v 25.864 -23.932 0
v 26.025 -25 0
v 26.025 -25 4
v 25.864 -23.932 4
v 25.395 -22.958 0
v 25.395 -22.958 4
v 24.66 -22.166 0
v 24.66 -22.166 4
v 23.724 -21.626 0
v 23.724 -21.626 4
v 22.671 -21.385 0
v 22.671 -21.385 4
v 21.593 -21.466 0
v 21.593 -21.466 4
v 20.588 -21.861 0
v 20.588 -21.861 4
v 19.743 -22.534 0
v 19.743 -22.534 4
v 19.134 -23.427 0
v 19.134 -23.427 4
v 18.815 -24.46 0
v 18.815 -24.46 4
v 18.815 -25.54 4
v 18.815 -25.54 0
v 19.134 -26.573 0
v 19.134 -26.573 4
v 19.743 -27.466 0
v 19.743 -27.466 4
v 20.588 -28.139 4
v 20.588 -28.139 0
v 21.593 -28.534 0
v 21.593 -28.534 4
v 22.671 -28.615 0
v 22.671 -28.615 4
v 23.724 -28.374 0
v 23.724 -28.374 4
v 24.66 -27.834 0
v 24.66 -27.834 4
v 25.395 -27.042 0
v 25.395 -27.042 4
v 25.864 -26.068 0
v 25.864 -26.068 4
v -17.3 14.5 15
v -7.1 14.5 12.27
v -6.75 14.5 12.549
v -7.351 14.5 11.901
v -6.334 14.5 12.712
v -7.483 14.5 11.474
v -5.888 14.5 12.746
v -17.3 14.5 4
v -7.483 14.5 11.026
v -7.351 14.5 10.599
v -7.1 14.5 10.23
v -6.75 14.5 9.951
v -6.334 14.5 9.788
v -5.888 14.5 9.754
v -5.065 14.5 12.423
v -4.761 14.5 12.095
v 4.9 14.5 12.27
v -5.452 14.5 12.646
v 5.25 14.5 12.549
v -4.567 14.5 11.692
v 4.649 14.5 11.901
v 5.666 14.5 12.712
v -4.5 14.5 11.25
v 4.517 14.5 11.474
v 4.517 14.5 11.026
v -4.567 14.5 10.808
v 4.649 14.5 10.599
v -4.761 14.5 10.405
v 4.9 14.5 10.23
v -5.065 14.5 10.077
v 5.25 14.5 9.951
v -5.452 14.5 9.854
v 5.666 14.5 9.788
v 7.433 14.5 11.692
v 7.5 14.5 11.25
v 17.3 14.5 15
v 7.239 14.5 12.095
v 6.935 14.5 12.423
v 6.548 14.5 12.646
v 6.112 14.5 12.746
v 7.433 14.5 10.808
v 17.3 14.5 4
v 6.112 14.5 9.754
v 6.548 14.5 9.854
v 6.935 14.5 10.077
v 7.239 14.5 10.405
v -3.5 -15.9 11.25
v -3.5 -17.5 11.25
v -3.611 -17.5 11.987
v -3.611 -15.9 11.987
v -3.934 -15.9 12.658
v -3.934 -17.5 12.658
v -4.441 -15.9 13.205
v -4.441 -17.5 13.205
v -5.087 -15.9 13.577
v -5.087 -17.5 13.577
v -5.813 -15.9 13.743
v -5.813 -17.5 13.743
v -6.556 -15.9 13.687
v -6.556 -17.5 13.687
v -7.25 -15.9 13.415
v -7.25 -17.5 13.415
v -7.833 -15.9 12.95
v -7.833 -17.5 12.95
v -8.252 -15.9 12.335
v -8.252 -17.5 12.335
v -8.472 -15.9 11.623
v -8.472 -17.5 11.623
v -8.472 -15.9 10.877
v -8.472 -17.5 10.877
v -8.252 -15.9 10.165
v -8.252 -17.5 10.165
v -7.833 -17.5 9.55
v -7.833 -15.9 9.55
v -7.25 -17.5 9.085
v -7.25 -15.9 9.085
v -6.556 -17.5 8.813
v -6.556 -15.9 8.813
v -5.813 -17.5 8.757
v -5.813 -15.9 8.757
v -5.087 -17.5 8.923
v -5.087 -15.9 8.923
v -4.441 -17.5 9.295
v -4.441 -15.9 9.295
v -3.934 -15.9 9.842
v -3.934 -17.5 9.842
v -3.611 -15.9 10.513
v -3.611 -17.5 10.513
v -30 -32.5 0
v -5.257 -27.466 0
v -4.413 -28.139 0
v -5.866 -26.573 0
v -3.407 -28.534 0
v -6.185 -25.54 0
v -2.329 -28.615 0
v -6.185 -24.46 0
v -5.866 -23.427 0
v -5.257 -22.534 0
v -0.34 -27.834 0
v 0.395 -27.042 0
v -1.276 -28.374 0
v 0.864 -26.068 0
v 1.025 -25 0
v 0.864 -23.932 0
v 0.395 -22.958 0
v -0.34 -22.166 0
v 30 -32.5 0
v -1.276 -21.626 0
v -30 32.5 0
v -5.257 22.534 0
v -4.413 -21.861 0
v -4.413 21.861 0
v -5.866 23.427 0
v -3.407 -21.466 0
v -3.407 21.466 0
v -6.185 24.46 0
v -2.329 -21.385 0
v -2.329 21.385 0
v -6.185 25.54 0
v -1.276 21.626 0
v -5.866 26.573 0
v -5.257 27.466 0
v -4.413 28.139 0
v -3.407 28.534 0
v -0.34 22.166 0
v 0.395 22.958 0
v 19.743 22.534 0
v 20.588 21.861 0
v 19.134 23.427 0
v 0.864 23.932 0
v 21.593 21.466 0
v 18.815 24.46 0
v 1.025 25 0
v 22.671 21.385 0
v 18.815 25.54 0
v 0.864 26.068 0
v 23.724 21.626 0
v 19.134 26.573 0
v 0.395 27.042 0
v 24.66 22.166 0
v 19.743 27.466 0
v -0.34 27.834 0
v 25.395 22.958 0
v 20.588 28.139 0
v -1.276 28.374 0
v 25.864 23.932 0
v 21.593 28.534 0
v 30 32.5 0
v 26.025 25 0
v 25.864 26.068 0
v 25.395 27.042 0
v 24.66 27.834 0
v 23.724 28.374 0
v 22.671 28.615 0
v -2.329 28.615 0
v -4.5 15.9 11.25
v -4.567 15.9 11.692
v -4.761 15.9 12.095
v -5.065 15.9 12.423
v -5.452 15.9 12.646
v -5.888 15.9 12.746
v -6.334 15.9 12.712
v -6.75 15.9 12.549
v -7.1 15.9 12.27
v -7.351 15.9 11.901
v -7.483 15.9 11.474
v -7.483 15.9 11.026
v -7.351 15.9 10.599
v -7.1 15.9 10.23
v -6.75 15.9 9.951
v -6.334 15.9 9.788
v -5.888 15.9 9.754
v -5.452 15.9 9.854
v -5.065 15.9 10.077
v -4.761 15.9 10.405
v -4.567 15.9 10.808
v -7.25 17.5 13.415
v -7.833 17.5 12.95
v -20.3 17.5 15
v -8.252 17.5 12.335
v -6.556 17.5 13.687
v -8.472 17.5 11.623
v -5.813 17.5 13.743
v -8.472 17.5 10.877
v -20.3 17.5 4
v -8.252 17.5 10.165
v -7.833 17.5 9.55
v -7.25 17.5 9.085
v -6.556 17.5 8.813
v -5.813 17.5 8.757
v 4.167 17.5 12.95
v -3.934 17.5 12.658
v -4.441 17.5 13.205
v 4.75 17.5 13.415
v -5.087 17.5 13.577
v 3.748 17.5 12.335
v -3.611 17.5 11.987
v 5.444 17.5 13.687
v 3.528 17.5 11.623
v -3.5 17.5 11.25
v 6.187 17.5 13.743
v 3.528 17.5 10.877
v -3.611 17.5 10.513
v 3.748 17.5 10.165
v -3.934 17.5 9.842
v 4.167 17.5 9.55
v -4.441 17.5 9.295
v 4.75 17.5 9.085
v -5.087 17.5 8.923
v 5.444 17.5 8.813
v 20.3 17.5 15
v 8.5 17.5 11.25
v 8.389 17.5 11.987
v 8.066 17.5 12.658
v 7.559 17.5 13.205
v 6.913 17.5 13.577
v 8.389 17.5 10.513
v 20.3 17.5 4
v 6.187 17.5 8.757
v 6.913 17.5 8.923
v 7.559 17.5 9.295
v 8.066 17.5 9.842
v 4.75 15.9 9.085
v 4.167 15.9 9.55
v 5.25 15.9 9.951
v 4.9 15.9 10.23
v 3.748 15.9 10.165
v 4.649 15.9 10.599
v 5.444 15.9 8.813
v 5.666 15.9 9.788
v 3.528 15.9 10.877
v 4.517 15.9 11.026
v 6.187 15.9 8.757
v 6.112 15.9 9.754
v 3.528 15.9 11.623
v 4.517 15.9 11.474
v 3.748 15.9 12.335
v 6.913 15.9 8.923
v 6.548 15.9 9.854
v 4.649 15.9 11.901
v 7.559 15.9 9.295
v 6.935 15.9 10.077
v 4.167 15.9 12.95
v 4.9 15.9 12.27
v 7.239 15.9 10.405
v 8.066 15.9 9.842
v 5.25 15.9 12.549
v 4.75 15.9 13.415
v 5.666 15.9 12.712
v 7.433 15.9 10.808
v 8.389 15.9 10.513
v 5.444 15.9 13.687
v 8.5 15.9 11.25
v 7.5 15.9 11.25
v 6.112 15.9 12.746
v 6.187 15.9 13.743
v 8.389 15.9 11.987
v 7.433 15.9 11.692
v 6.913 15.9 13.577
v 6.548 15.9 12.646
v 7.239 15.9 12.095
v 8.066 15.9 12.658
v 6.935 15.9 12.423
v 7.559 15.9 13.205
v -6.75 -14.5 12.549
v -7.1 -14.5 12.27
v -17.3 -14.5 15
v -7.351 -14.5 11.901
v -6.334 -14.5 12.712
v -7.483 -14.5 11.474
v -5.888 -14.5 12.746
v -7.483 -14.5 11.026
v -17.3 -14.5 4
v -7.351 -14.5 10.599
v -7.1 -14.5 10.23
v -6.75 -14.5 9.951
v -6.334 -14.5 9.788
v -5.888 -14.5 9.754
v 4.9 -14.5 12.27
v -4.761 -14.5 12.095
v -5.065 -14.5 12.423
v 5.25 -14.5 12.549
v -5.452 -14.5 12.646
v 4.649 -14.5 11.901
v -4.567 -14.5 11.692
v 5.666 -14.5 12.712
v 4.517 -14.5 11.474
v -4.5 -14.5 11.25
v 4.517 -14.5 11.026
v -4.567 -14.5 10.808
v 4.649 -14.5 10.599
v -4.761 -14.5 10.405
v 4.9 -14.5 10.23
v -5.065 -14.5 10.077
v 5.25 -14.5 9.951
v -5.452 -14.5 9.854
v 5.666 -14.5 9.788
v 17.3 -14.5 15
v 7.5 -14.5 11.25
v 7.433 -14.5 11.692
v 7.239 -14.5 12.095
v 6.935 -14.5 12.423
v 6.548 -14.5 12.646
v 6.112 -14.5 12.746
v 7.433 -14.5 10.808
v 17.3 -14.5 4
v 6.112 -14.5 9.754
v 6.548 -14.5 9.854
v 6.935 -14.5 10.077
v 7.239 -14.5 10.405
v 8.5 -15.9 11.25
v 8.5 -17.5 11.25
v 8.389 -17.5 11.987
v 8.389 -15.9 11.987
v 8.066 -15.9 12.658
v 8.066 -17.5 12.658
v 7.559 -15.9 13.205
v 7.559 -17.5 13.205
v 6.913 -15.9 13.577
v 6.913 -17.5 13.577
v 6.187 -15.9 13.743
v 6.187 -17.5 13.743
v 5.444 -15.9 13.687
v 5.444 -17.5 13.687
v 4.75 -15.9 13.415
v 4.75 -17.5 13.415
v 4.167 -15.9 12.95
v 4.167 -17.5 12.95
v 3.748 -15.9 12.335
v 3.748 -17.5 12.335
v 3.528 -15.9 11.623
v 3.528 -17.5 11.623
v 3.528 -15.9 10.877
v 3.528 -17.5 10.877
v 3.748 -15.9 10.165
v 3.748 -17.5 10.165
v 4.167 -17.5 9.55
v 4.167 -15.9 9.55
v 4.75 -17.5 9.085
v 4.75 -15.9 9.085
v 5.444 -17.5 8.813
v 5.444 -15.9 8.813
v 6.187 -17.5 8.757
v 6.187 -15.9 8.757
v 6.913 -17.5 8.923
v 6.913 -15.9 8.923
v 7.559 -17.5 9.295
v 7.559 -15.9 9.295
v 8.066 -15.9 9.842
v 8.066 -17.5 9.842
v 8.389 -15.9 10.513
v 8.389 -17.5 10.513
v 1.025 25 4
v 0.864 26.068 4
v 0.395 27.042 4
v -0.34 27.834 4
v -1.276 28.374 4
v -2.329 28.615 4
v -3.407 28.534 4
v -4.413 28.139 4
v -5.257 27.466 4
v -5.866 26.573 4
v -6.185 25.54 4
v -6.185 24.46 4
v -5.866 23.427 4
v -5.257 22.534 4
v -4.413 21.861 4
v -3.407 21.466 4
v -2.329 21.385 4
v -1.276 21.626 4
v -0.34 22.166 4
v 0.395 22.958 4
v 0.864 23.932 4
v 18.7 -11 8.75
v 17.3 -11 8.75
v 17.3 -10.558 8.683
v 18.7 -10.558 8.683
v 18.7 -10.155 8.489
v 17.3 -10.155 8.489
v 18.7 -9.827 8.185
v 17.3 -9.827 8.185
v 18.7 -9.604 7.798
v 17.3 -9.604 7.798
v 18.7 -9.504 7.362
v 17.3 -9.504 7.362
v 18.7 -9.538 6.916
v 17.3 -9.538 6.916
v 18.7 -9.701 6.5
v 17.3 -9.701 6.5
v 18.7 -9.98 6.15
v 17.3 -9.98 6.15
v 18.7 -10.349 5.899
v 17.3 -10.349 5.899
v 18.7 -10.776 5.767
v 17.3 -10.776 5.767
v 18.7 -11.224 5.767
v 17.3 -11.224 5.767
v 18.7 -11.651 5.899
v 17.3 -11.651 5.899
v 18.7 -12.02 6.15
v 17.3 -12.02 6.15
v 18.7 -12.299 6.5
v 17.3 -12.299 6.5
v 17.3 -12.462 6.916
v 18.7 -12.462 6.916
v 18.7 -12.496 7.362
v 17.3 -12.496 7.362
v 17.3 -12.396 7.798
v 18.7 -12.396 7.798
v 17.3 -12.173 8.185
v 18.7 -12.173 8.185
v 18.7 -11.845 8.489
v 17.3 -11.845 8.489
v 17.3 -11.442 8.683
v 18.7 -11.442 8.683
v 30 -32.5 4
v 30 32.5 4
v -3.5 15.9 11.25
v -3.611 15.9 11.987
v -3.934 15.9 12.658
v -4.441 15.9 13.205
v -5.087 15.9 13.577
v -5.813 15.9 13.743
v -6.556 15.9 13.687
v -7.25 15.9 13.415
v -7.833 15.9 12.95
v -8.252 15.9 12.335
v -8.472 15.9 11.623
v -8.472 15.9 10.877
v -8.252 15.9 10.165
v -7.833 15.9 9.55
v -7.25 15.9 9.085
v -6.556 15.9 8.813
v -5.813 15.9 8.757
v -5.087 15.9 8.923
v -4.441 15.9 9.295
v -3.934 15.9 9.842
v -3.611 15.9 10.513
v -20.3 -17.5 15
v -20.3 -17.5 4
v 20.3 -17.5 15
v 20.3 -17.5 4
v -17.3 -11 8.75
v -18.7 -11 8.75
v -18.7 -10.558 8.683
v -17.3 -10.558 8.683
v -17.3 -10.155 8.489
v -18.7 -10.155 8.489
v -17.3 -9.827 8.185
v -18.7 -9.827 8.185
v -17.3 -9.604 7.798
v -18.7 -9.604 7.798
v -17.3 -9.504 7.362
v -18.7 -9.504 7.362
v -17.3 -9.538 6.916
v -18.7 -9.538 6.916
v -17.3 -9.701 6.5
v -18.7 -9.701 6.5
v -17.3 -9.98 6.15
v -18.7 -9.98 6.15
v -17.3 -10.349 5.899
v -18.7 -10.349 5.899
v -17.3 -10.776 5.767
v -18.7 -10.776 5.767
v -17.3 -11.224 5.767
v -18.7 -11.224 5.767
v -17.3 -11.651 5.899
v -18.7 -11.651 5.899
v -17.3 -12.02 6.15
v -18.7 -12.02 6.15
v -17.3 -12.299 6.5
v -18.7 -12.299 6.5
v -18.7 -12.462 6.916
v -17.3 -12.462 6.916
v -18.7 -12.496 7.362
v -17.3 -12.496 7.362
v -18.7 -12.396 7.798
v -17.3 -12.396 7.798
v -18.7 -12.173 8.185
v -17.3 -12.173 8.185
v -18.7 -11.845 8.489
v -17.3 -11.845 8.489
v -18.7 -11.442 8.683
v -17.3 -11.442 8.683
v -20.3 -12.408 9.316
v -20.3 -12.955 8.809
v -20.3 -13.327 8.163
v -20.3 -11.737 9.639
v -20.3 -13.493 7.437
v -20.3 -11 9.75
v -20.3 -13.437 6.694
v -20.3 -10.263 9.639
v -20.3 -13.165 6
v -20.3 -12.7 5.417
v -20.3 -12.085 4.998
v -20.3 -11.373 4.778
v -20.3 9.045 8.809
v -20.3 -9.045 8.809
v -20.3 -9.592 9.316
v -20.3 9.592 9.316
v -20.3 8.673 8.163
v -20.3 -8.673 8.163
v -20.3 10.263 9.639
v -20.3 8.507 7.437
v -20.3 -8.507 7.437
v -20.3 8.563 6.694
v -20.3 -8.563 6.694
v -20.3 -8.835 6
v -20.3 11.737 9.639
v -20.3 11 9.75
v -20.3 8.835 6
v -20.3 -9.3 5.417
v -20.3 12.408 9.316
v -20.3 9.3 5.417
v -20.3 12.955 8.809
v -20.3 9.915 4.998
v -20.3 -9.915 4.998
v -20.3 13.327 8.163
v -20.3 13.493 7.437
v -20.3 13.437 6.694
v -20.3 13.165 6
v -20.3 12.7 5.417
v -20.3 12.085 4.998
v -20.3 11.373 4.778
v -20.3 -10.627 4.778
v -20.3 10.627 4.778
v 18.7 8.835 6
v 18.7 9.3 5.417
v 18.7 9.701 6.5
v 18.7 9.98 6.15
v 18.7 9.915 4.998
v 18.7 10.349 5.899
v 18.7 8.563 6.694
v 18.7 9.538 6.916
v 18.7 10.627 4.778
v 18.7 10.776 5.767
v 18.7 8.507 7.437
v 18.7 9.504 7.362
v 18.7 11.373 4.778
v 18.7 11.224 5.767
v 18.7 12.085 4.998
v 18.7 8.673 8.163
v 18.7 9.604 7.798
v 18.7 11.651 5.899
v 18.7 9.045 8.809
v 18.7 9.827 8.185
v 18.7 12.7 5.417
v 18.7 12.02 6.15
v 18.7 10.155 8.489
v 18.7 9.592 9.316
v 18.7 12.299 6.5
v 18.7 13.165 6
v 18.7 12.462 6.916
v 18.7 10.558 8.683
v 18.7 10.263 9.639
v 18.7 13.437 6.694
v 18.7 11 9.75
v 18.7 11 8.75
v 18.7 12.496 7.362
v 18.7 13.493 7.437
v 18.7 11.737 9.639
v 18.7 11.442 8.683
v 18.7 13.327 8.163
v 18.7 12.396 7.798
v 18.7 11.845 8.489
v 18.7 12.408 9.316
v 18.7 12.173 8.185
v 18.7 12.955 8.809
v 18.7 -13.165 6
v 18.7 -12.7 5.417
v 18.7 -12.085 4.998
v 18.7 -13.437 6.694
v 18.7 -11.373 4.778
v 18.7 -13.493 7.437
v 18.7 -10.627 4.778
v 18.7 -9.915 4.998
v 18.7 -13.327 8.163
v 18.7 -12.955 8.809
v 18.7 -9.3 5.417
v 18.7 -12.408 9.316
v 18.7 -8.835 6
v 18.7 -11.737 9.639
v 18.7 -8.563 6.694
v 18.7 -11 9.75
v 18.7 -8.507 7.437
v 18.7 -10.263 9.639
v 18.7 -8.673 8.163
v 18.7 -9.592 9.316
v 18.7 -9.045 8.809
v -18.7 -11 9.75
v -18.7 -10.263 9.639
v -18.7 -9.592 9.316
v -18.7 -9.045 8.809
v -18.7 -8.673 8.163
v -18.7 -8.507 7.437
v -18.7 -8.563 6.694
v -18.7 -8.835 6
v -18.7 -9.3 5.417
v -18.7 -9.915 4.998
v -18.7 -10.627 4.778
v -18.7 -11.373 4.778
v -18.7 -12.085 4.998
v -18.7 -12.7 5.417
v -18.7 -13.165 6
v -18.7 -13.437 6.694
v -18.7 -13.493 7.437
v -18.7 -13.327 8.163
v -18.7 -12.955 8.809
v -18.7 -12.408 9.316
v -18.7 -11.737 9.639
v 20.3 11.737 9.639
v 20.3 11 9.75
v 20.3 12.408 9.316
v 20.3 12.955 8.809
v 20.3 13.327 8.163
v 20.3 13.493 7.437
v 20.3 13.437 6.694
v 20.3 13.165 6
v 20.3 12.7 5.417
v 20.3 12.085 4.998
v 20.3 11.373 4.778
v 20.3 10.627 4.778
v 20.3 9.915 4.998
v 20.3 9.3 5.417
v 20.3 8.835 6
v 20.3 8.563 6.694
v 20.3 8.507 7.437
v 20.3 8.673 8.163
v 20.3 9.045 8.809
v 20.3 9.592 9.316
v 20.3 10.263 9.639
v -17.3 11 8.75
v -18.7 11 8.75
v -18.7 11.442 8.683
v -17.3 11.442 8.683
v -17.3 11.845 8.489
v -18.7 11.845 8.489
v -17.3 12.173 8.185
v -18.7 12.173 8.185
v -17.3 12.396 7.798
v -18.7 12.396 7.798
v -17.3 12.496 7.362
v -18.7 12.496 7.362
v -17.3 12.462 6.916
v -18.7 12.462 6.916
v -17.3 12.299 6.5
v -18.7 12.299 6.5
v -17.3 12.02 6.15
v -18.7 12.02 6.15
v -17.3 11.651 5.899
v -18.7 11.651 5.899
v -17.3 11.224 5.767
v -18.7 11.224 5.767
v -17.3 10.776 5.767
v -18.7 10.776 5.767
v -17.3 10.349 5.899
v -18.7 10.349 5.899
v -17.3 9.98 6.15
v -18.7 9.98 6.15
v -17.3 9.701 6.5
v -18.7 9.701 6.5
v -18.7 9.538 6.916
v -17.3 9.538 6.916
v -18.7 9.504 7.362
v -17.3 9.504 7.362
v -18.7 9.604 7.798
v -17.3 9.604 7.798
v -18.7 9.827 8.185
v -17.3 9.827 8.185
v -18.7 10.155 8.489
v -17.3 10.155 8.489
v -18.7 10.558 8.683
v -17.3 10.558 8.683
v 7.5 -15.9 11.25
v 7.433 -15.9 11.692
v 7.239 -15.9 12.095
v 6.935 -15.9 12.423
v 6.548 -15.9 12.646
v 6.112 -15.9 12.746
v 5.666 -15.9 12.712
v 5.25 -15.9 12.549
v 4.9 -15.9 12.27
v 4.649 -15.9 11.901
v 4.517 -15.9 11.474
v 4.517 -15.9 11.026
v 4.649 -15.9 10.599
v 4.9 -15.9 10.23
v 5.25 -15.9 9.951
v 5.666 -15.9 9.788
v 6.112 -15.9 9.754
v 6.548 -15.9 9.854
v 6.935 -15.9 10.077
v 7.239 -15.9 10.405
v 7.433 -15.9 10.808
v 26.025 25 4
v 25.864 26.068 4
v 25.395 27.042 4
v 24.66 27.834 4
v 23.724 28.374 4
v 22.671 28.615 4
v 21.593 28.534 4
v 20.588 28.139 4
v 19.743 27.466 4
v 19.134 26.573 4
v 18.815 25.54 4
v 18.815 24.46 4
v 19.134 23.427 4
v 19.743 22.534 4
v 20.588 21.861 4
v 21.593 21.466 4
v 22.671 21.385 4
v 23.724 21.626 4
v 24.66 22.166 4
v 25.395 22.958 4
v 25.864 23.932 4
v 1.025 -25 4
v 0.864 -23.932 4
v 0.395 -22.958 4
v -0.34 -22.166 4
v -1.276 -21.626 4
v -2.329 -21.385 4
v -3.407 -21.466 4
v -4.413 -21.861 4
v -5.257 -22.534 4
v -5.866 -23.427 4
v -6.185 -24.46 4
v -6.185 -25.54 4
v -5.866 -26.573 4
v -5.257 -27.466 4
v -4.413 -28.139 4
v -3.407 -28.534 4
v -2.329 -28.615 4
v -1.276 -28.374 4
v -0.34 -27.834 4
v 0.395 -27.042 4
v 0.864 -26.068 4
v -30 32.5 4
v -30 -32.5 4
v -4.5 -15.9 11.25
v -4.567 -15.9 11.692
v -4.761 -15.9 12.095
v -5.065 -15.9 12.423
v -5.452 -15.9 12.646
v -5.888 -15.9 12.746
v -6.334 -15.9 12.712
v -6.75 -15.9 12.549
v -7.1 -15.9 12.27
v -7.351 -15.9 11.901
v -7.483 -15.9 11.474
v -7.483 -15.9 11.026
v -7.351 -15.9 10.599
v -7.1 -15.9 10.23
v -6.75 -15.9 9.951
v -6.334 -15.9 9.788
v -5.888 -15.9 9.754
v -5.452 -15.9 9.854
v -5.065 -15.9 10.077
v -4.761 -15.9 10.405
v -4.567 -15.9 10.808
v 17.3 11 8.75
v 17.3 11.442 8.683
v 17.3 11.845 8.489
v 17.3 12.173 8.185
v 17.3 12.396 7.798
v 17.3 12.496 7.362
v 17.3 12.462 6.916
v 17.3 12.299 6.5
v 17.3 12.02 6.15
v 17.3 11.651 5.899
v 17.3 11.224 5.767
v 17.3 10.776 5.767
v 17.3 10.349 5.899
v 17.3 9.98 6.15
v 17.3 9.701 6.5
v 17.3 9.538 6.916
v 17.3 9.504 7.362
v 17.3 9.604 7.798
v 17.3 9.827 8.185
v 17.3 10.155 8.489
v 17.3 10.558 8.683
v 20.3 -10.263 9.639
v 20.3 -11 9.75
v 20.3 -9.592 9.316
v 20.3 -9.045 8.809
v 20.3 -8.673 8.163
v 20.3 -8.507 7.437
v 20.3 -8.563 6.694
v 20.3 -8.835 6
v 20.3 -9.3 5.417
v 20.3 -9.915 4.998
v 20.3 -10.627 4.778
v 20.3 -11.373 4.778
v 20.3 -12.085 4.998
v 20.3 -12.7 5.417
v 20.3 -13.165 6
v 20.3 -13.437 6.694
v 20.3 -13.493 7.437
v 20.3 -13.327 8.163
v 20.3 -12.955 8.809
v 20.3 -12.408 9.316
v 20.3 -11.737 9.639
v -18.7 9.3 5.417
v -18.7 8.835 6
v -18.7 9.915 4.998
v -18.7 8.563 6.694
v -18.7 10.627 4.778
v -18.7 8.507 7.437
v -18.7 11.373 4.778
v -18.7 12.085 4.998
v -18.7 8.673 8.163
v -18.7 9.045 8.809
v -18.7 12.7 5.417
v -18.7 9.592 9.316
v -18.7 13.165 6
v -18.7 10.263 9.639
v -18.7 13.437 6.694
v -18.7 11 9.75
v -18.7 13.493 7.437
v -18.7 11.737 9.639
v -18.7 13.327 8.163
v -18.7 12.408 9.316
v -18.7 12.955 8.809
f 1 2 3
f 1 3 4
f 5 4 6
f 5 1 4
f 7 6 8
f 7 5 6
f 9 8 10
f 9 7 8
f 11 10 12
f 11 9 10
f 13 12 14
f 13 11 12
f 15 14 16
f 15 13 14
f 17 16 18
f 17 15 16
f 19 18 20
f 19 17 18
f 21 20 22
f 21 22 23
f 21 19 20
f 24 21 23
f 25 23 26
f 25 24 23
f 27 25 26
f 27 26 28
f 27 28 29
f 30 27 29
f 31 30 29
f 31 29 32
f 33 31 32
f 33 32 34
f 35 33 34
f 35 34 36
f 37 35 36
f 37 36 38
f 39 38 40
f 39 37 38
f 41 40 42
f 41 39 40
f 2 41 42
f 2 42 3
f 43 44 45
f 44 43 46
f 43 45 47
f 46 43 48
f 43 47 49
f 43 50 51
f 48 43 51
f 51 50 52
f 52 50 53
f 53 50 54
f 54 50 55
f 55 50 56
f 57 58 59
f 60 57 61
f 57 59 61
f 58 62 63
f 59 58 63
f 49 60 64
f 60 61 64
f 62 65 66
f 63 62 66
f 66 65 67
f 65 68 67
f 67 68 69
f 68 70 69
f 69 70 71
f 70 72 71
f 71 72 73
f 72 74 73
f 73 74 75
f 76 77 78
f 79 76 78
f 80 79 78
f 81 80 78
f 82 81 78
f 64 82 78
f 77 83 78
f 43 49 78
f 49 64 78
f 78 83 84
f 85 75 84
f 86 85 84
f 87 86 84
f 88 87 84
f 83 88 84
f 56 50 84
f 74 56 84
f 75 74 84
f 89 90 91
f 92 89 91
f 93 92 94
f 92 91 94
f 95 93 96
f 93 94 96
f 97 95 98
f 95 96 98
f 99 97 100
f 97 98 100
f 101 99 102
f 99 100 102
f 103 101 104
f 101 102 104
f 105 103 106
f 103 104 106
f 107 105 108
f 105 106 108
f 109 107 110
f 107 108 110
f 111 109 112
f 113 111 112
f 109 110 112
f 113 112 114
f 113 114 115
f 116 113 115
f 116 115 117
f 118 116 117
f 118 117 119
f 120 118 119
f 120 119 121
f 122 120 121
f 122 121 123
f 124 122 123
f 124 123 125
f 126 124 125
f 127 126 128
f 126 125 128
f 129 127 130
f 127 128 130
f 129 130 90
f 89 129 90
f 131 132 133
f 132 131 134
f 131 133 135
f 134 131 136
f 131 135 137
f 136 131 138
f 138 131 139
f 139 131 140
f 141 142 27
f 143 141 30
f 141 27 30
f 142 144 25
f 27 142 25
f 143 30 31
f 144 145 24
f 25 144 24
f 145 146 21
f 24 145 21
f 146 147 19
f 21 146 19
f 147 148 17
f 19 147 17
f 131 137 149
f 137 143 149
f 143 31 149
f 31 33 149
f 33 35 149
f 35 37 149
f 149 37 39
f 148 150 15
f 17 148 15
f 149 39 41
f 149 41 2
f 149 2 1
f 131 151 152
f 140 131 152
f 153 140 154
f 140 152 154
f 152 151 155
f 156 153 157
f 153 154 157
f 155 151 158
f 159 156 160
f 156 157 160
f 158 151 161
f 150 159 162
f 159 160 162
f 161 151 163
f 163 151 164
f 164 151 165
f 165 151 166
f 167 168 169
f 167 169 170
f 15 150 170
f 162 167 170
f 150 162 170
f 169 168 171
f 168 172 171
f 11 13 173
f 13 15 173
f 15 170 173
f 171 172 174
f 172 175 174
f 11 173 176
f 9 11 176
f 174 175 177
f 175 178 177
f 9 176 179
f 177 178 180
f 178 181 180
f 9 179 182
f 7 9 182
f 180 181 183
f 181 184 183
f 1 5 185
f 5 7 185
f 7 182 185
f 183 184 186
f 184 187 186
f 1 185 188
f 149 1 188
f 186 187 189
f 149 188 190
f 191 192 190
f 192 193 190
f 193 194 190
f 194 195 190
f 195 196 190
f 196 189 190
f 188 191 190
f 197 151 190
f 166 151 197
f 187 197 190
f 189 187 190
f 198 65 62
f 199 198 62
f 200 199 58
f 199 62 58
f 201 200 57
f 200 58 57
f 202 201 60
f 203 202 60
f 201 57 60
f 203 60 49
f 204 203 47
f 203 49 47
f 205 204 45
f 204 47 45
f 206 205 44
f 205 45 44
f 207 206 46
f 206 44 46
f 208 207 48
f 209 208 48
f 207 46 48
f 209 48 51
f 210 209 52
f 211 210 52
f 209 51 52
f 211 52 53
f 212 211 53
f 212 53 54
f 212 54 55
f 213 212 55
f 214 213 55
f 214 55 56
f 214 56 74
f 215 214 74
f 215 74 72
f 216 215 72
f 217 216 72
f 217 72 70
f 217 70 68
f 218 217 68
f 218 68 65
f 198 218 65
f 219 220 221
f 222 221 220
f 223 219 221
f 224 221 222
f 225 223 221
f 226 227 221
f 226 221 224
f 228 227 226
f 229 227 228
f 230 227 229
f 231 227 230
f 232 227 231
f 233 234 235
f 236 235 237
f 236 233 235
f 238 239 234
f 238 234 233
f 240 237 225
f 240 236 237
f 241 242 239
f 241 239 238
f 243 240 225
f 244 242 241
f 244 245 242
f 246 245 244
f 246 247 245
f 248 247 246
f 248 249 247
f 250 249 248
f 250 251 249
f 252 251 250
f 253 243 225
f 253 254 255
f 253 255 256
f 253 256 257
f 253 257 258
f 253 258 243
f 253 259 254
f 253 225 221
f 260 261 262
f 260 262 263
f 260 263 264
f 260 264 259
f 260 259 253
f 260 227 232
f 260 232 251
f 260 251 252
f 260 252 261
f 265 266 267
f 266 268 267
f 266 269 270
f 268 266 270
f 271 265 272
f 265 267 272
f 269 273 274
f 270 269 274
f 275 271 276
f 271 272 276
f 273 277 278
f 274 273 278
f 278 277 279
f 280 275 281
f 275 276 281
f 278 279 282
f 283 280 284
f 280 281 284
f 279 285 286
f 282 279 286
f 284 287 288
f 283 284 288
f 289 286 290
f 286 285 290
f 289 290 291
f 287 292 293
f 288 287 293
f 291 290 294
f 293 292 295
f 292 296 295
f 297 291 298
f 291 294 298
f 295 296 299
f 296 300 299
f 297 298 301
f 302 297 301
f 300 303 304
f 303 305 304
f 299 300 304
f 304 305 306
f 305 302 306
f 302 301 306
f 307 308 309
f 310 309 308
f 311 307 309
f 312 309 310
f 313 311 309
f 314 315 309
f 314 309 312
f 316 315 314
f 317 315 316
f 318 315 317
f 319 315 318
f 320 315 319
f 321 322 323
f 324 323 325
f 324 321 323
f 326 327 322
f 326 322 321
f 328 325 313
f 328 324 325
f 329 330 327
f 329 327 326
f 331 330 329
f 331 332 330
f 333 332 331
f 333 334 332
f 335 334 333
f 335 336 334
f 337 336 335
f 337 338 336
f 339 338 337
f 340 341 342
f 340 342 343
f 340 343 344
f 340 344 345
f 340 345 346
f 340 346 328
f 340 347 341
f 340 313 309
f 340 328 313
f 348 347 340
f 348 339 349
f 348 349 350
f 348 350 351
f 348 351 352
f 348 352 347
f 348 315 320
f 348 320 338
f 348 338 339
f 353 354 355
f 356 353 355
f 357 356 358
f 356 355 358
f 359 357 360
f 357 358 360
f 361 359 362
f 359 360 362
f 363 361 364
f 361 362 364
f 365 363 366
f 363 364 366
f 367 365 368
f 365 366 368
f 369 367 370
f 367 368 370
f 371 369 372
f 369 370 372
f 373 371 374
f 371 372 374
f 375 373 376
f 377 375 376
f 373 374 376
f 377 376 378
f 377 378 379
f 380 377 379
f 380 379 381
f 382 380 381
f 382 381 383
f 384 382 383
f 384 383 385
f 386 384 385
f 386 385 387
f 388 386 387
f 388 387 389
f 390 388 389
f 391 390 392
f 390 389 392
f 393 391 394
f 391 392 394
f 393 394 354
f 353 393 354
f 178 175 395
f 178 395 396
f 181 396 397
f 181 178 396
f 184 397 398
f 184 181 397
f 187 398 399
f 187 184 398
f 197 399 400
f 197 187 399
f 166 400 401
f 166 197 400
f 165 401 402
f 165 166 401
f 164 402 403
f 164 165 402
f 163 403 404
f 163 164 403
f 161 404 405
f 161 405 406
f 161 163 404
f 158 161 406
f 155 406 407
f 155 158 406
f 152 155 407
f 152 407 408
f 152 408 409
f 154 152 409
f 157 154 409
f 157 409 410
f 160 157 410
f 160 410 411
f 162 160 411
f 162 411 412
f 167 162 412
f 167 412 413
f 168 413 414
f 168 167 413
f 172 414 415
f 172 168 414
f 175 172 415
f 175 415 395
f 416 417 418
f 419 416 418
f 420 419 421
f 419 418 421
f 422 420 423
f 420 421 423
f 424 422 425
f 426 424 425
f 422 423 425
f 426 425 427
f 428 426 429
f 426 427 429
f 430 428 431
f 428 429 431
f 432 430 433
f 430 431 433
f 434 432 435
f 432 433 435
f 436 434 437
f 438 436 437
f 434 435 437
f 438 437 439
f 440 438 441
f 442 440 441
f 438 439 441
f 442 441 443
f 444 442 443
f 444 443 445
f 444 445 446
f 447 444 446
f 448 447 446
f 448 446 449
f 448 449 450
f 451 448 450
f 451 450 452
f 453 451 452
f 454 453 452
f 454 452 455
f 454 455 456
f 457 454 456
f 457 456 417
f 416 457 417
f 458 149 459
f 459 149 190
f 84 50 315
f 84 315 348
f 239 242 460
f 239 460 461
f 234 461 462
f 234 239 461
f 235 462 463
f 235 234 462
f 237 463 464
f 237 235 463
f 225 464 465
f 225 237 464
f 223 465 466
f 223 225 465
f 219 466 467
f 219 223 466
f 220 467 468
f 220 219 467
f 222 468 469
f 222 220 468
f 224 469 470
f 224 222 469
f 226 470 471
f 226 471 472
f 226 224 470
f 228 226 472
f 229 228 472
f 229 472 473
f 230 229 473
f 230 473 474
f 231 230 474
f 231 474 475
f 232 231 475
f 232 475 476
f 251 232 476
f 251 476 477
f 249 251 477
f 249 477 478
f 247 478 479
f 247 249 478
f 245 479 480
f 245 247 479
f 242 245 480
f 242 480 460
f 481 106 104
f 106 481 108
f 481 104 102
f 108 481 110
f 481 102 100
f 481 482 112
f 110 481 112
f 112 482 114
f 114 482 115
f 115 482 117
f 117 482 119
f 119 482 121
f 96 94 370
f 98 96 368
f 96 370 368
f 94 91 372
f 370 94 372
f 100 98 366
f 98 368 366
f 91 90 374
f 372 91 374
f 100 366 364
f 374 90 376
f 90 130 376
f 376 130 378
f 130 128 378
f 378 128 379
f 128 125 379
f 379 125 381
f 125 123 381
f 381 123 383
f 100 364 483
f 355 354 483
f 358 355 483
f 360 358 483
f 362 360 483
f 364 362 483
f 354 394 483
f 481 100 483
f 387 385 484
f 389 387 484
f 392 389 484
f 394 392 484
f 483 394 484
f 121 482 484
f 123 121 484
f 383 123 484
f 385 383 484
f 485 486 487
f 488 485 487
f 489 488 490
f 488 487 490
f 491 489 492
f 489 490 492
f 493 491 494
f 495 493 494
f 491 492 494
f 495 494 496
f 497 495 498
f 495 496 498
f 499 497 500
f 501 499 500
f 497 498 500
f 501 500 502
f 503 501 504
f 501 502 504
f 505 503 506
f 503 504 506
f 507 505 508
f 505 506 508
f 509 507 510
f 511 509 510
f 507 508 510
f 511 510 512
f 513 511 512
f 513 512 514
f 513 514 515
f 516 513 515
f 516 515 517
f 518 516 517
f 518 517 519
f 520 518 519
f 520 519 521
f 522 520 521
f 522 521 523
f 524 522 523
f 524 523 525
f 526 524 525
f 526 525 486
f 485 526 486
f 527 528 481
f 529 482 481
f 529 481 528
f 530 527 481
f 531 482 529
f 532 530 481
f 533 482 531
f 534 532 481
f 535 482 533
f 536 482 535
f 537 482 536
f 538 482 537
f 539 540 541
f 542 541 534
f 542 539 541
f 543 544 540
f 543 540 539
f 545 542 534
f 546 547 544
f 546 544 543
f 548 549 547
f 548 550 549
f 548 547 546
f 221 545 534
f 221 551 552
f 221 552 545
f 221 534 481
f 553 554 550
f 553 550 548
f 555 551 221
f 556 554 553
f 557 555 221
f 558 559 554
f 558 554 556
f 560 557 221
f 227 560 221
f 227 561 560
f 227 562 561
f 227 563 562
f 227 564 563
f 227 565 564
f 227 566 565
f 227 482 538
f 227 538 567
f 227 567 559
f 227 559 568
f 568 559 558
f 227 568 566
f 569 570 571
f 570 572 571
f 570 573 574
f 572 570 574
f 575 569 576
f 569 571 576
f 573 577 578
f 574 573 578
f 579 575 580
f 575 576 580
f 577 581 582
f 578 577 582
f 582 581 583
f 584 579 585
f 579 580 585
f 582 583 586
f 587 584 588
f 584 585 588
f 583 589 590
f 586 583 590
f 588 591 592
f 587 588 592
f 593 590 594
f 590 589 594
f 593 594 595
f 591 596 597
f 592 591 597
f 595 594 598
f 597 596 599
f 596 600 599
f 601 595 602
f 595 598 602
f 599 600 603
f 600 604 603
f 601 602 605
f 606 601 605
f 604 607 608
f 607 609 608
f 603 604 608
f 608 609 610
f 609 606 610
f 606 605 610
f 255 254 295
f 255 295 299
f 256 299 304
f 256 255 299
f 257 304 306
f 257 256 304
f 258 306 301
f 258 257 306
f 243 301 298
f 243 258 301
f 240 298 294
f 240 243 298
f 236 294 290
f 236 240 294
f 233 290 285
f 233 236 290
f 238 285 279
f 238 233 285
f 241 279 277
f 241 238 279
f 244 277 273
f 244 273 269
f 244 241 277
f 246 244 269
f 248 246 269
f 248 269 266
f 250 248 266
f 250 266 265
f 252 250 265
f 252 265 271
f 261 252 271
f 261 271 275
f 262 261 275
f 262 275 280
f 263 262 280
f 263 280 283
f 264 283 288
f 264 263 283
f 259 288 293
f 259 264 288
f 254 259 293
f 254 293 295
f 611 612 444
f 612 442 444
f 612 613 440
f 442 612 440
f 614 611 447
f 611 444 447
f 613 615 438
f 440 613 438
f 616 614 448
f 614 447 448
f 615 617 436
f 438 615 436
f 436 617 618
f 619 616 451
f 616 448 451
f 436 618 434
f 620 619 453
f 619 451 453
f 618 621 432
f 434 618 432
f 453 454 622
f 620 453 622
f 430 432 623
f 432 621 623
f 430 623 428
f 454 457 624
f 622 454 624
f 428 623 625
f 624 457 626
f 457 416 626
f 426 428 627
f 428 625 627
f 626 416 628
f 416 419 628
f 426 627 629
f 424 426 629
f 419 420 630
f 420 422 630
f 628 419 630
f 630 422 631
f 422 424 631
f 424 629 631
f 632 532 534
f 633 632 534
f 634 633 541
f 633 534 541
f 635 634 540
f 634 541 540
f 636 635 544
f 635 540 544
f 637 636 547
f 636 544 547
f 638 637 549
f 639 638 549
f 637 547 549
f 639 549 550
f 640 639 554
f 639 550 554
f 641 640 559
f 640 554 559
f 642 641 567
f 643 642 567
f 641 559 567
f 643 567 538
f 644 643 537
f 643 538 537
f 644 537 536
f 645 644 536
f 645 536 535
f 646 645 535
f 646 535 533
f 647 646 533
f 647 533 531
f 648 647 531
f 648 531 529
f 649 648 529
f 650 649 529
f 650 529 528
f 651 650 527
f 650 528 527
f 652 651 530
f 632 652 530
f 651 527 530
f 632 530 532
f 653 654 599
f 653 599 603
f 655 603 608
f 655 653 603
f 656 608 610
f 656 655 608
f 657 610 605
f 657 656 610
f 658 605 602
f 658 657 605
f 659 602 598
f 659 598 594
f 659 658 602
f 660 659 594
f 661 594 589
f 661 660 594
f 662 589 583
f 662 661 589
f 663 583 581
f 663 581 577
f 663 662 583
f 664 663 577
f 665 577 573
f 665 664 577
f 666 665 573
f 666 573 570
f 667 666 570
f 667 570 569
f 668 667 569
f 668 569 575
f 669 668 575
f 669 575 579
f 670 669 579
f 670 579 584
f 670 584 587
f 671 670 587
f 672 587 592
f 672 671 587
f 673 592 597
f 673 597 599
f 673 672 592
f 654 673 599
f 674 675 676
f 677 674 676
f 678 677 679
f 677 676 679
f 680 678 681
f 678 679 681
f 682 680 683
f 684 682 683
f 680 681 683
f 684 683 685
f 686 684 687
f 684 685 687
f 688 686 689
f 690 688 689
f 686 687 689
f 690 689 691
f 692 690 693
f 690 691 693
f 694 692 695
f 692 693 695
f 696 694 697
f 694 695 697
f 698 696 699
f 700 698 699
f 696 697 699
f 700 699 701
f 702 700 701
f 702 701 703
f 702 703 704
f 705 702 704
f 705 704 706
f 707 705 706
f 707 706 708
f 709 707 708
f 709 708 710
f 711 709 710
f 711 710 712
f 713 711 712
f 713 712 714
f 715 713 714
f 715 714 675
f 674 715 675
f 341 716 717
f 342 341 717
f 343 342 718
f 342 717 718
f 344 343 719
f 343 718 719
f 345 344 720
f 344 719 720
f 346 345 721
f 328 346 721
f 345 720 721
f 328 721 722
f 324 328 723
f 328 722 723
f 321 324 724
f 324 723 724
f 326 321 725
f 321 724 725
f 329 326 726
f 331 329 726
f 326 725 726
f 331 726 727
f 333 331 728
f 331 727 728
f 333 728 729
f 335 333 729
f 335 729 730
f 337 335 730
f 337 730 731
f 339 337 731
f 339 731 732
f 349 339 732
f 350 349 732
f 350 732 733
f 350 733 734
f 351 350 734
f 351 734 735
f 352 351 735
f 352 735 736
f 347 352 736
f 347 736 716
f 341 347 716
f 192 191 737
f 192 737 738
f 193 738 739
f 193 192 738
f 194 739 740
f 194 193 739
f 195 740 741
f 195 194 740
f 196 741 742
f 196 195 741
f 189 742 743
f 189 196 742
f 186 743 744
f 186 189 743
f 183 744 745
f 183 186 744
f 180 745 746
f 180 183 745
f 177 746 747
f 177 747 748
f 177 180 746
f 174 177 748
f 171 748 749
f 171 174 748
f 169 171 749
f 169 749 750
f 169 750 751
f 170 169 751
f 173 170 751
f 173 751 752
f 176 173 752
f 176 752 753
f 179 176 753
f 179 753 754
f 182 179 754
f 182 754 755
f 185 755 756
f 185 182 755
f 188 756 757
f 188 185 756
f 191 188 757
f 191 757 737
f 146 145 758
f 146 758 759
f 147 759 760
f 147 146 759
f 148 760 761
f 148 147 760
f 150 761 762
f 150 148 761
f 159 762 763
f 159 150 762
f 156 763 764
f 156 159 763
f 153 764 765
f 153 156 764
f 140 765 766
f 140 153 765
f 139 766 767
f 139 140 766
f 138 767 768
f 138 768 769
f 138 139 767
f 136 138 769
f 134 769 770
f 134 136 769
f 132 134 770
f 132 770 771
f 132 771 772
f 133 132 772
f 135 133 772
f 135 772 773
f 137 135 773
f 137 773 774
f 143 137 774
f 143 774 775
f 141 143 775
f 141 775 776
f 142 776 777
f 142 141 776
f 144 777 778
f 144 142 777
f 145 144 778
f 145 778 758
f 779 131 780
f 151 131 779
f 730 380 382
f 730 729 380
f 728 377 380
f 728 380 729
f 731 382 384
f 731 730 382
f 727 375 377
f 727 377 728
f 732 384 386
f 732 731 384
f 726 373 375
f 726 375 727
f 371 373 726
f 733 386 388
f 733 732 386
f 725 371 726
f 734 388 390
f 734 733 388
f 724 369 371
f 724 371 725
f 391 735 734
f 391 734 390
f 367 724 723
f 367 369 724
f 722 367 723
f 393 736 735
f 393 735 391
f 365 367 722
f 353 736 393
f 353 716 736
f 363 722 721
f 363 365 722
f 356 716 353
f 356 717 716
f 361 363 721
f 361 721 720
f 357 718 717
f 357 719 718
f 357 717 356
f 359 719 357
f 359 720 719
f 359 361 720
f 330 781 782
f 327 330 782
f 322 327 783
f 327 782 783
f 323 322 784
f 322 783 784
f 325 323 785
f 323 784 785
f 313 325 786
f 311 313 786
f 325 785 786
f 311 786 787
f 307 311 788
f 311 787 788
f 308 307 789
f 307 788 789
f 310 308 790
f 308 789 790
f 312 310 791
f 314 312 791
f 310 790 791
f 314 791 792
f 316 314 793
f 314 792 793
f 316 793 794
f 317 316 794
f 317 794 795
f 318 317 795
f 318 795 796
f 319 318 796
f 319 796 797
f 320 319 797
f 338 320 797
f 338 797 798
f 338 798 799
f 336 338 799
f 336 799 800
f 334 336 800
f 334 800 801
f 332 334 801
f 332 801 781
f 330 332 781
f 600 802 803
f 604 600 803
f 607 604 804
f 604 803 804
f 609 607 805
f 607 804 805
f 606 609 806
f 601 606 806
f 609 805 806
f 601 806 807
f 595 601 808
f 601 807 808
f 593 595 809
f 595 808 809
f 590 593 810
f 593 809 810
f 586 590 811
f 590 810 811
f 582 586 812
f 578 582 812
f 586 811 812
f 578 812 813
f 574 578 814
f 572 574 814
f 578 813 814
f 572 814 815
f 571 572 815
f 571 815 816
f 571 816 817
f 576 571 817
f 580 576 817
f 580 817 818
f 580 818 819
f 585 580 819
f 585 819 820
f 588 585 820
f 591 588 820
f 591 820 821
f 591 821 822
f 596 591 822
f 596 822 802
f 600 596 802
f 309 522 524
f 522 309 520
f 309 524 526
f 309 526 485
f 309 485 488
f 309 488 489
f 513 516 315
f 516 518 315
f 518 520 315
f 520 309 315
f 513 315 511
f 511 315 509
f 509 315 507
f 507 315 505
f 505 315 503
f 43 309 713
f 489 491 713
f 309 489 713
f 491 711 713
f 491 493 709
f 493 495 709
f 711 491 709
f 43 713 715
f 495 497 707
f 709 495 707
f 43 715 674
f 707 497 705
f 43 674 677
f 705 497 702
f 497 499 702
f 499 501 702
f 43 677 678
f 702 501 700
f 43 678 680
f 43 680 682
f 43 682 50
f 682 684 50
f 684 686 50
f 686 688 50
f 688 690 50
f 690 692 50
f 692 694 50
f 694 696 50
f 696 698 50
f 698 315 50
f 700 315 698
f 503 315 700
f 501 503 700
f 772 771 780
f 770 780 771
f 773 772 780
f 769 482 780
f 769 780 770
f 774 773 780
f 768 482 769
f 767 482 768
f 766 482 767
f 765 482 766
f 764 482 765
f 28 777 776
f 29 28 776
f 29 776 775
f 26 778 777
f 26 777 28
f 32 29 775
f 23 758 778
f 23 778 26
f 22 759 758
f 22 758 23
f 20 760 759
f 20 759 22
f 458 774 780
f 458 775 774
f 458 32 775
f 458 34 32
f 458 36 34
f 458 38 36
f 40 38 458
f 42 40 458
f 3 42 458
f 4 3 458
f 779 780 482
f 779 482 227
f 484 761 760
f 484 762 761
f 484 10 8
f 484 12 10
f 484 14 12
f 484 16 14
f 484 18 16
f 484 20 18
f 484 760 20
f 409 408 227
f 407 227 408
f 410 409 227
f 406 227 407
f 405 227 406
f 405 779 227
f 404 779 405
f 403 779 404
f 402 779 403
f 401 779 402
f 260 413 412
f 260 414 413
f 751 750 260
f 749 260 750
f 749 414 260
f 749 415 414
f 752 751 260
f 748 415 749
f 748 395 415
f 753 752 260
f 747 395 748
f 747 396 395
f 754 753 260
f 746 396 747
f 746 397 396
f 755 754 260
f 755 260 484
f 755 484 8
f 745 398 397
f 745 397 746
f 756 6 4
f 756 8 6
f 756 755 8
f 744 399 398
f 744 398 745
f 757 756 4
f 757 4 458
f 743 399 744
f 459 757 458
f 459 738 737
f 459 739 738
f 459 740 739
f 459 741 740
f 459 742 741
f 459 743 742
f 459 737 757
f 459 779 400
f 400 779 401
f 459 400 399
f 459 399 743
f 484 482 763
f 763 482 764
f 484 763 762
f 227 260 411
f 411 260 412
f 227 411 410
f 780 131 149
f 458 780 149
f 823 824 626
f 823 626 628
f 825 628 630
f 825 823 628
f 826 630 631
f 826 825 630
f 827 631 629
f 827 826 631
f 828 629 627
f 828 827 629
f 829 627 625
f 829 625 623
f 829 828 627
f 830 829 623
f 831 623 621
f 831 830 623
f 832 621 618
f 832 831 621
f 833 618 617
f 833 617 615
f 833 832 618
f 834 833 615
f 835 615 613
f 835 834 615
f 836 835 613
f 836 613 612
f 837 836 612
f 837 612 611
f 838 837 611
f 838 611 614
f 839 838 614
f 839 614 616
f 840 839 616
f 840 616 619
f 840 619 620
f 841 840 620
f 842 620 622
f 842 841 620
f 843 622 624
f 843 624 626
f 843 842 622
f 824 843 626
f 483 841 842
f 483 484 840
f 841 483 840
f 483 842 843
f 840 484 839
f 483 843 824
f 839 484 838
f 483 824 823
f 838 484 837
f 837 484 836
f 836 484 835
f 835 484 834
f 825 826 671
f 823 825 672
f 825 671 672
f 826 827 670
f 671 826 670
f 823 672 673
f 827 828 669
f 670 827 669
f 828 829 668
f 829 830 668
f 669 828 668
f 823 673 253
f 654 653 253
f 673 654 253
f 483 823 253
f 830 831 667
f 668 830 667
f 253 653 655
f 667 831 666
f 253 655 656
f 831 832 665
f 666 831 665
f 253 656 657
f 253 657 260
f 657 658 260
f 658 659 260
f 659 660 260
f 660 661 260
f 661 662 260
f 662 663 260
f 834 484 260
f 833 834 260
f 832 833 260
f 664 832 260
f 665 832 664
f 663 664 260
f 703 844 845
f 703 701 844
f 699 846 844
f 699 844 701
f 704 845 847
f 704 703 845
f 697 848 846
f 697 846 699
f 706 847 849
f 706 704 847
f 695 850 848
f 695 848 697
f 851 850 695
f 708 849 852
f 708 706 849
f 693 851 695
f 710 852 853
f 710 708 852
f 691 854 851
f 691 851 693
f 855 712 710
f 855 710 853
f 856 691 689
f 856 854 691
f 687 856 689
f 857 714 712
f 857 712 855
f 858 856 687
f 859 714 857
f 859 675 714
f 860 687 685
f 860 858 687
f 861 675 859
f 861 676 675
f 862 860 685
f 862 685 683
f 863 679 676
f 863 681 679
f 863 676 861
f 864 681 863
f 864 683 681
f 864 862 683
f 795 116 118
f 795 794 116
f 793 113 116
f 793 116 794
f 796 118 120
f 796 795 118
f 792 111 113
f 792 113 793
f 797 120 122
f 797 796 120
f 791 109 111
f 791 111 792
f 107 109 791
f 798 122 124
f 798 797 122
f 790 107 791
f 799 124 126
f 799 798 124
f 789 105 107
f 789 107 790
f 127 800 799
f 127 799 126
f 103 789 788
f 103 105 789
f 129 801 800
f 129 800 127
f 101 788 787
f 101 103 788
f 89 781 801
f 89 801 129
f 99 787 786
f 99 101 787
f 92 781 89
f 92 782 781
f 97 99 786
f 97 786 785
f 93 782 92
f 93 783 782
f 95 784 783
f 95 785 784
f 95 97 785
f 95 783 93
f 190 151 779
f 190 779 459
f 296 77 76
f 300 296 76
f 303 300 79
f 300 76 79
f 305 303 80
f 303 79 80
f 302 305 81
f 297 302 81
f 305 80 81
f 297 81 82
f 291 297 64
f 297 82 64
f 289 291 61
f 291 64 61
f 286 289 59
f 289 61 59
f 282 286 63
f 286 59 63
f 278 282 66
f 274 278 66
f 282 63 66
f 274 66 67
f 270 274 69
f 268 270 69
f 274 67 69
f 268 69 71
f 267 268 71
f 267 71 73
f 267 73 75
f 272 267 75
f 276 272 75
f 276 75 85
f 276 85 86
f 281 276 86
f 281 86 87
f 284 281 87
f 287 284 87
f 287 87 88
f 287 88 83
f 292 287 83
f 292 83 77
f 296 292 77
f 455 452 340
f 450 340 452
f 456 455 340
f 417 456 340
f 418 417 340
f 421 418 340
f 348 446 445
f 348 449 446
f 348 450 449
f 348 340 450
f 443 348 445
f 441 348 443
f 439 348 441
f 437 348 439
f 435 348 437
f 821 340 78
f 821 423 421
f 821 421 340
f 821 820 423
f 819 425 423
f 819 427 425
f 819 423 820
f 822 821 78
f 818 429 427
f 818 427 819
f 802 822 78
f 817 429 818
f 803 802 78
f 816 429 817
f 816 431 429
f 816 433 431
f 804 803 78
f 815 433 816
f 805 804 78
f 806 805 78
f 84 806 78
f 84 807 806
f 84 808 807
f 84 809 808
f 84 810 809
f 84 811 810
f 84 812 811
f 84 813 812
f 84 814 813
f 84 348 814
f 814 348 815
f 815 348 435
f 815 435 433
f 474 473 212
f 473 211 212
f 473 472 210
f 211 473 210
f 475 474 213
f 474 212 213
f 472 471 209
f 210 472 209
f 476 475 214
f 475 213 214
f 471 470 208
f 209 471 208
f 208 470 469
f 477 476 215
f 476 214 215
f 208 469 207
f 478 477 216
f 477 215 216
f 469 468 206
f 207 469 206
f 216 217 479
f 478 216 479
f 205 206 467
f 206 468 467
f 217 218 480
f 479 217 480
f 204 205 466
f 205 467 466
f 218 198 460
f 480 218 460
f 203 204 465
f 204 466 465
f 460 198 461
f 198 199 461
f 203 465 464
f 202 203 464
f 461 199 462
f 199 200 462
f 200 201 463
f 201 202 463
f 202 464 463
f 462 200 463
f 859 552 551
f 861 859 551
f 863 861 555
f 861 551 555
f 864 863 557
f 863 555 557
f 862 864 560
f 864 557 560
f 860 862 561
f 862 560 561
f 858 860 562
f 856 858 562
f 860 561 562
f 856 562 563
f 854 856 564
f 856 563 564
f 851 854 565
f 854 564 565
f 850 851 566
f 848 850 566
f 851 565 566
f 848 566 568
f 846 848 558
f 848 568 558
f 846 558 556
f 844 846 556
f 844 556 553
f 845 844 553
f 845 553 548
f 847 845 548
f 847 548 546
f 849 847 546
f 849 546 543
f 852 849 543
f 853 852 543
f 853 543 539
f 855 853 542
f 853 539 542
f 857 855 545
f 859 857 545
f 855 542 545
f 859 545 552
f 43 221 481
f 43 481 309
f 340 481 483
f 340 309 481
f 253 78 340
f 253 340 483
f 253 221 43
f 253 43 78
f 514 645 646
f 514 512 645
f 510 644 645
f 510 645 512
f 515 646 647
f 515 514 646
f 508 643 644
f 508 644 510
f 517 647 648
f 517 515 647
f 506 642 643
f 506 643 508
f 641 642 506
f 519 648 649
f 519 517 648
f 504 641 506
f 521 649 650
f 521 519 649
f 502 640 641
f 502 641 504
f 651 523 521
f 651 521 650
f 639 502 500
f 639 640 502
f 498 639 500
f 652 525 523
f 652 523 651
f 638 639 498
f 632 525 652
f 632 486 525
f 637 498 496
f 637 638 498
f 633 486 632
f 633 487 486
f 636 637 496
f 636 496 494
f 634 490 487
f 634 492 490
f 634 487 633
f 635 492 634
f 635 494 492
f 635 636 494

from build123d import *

# Parameters (mm, degrees)
SKETCH_1_W          = 60
SKETCH_1_H          = 65
SKETCH_1_R          = 3.625
EXTRUDE_1_DEPTH     = 4
SKETCH_2_W          = 40.6
SKETCH_2_H          = 35
SKETCH_2_W_2        = 34.6
SKETCH_2_H_2        = 29
EXTRUDE_2_DEPTH     = 11
SKETCH_3_R          = 1.5
CUT_EXTRUDE_1_DEPTH = 51
SKETCH_4_R          = 2.5
CUT_EXTRUDE_2_DEPTH = 1.6
SKETCH_5_R          = 1.5
CUT_EXTRUDE_3_DEPTH = 51.3
SKETCH_6_R          = 2.5
CUT_EXTRUDE_4_DEPTH = 1.6


with BuildPart() as part:
    # 스케치1 → 보스-돌출1 (new body)
    with BuildSketch(Plane.XY):
        Rectangle(SKETCH_1_W, SKETCH_1_H)
        with Locations((-2.6, 25)):
            Circle(SKETCH_1_R, mode=Mode.SUBTRACT)
        with Locations((-2.6, -25)):
            Circle(SKETCH_1_R, mode=Mode.SUBTRACT)
        with Locations((22.4, 25)):
            Circle(SKETCH_1_R, mode=Mode.SUBTRACT)
        with Locations((22.4, -25)):
            Circle(SKETCH_1_R, mode=Mode.SUBTRACT)
    extrude(amount=EXTRUDE_1_DEPTH)

    # 스케치2 → 보스-돌출2 (add)
    with BuildSketch(Plane.XY.offset(4)):
        Rectangle(SKETCH_2_W, SKETCH_2_H)
        Rectangle(SKETCH_2_W_2, SKETCH_2_H_2, mode=Mode.SUBTRACT)
    extrude(amount=EXTRUDE_2_DEPTH)

    # 스케치3 → 컷-돌출1 (cut, through all)
    with BuildSketch(Plane.XZ.offset(17.5)):
        with Locations((-6, 11.25)):
            Circle(SKETCH_3_R)
        with Locations((6, 11.25)):
            Circle(SKETCH_3_R)
    extrude(amount=-CUT_EXTRUDE_1_DEPTH, mode=Mode.SUBTRACT)

    # 스케치4 → 컷-돌출2 (cut)
    with BuildSketch(Plane.XZ.offset(17.5)):
        with Locations((-6, 11.25)):
            Circle(SKETCH_4_R)
        with Locations((6, 11.25)):
            Circle(SKETCH_4_R)
    cut_extrude_2 = extrude(amount=-CUT_EXTRUDE_2_DEPTH, mode=Mode.SUBTRACT)

    # 대칭 복사1: 컷-돌출2 across plane
    add(cut_extrude_2.mirror(Plane.ZX), mode=Mode.SUBTRACT)

    # 스케치5 → 컷-돌출3 (cut, through all)
    with BuildSketch(Plane.ZY.offset(20.3)):
        with Locations((7.25, -11)):
            Circle(SKETCH_5_R)
        with Locations((7.25, 11)):
            Circle(SKETCH_5_R)
    extrude(amount=-CUT_EXTRUDE_3_DEPTH, mode=Mode.SUBTRACT)

    # 스케치6 → 컷-돌출4 (cut)
    with BuildSketch(Plane.ZY.offset(20.3)):
        with Locations((7.25, 11)):
            Circle(SKETCH_6_R)
        with Locations((7.25, -11)):
            Circle(SKETCH_6_R)
    cut_extrude_4 = extrude(amount=-CUT_EXTRUDE_4_DEPTH, mode=Mode.SUBTRACT)

    # 대칭 복사2: 컷-돌출4 across plane
    add(cut_extrude_4.mirror(Plane(origin=(0, 0, 0), x_dir=(0, 0, 1), z_dir=(1, 0, 0))), mode=Mode.SUBTRACT)


solid = part.part
